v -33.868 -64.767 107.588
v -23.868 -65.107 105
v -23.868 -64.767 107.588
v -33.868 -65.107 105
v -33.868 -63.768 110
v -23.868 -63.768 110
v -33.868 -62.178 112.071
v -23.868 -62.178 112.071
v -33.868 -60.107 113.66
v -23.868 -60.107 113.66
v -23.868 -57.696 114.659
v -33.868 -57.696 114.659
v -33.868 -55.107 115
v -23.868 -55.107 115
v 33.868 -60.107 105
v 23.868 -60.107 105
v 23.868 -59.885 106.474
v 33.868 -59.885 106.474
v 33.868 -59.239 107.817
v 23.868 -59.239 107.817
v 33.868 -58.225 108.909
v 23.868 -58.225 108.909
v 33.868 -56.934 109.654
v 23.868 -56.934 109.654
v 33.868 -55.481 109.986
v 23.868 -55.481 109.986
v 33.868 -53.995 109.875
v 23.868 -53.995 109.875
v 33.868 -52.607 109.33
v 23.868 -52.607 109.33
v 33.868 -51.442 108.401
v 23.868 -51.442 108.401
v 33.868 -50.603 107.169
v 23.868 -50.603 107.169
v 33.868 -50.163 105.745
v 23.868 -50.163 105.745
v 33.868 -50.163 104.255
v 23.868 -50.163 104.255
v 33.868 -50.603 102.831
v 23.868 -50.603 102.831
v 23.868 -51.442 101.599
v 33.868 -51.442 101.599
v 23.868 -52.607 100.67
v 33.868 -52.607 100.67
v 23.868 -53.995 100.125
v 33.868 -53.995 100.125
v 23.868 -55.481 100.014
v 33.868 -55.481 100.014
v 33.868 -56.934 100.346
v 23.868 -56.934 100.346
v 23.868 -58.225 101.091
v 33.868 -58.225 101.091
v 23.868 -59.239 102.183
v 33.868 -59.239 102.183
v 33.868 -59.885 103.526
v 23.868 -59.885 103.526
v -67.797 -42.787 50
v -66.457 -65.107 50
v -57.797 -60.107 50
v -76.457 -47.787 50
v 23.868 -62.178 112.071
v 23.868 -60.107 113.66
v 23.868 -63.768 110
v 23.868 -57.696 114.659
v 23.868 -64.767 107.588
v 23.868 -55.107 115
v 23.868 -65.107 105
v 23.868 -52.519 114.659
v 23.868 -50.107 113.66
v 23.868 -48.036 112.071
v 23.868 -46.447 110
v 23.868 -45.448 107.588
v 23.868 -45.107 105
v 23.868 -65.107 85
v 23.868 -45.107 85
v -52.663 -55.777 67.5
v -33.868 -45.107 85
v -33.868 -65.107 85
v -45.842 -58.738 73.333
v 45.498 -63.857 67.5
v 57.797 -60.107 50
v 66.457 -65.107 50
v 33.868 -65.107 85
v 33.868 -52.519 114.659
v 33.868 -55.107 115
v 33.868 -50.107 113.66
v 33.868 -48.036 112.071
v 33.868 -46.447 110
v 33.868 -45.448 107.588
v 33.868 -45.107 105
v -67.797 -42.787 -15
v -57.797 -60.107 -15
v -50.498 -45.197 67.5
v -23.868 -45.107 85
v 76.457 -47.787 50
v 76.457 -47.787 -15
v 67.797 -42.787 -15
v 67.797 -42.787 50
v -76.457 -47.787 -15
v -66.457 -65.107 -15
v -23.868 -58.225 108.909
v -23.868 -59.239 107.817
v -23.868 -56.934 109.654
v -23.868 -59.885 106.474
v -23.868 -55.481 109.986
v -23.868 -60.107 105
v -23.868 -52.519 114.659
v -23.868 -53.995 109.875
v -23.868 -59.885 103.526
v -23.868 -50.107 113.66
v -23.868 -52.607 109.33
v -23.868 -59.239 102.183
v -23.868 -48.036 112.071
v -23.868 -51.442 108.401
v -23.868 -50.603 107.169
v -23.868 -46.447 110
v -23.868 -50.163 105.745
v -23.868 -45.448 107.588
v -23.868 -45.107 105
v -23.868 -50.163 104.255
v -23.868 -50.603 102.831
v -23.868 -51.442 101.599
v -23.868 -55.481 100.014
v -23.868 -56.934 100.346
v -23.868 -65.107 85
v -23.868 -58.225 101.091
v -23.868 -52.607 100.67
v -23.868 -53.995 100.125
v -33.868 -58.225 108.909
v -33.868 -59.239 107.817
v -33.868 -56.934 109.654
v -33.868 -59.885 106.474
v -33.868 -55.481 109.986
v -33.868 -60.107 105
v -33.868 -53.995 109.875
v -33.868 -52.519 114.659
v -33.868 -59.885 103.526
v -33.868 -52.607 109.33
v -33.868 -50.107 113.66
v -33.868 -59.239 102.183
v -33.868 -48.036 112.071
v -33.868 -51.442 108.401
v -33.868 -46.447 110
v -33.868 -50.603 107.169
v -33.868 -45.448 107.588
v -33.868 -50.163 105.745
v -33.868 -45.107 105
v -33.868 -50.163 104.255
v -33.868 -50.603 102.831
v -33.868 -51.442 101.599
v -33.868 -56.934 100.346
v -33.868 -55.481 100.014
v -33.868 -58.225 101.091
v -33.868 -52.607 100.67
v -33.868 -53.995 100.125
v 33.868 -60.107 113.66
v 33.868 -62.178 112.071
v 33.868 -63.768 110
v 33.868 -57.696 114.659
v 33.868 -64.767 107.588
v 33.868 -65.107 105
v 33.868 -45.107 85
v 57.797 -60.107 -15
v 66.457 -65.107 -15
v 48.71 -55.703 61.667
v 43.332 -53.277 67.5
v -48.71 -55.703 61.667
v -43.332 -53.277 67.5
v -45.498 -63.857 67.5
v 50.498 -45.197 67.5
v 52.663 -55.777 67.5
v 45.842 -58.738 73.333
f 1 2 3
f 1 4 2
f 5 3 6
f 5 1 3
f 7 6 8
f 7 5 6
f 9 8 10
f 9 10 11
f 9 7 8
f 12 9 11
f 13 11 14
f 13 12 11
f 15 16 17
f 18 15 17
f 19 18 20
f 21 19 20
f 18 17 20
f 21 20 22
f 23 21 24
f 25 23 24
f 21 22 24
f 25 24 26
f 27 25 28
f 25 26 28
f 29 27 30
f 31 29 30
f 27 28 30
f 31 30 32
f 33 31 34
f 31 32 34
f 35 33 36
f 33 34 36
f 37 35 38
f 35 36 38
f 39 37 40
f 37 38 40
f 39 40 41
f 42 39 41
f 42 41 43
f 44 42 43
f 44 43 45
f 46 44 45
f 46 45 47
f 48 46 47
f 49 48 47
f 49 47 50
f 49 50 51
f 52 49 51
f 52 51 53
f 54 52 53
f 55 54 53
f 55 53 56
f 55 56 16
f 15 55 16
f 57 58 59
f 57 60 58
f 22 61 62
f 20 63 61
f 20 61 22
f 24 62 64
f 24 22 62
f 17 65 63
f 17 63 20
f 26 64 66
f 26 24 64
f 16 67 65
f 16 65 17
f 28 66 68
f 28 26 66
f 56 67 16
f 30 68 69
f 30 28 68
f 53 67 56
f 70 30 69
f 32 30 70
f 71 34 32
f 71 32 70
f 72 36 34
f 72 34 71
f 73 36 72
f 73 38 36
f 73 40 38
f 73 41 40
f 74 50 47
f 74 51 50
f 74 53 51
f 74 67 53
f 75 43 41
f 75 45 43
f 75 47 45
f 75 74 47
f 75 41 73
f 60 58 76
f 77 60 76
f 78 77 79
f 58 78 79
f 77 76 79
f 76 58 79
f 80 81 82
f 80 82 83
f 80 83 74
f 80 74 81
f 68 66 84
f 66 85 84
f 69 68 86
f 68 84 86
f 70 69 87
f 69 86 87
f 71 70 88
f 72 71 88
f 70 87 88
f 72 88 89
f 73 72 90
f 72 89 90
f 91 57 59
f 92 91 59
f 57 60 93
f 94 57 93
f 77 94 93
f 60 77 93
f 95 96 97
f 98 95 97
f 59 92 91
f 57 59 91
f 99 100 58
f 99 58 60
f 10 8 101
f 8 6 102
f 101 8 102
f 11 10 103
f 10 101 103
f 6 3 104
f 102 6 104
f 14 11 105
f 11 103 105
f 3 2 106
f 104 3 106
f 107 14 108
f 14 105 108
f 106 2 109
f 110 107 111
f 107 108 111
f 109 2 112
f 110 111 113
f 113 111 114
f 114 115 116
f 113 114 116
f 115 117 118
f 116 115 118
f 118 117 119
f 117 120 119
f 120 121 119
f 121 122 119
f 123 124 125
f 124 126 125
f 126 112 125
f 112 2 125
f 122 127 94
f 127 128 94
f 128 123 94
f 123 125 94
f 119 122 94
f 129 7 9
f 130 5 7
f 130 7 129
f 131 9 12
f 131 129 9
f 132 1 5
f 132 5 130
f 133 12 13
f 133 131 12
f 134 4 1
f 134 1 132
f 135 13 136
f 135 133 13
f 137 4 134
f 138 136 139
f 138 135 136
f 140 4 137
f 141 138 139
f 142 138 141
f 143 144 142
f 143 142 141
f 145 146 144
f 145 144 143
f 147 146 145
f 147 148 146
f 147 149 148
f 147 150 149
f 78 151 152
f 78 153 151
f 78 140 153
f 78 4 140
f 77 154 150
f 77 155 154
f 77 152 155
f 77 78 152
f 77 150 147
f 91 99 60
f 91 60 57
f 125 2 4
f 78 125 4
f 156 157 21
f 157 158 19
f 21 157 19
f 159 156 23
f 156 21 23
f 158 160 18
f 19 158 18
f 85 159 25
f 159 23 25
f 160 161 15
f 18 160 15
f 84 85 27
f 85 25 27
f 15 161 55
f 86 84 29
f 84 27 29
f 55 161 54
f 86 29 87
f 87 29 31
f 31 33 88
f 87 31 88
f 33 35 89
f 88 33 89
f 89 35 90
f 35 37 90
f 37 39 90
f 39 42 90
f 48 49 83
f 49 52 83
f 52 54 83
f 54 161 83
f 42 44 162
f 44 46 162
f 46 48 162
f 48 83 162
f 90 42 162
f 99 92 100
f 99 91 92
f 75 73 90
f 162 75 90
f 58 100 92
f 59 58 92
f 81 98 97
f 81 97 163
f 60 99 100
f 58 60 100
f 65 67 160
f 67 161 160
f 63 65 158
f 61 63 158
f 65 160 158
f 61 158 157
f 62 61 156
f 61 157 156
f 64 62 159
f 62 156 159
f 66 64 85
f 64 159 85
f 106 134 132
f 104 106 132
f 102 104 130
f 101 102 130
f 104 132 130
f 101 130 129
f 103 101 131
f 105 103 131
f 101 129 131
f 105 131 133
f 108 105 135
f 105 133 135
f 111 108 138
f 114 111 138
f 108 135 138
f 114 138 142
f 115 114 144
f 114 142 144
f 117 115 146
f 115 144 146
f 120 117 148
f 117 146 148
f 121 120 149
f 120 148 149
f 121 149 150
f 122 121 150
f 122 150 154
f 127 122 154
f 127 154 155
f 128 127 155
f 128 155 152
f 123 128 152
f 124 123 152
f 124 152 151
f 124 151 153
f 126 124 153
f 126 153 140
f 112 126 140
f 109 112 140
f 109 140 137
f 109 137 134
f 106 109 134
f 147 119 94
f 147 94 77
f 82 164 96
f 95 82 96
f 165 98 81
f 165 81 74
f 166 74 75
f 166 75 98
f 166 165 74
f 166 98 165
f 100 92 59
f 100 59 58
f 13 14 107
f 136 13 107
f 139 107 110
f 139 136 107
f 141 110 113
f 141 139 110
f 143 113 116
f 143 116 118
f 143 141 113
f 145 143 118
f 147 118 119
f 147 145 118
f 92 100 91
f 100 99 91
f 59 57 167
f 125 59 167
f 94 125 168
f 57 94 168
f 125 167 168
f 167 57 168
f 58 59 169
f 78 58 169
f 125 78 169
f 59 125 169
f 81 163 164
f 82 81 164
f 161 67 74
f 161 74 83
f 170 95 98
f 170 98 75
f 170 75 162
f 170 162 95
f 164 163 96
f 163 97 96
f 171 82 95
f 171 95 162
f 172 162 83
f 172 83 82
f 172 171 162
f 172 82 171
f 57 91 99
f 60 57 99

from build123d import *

# Parameters (mm, degrees)
BOSS_EXTRUDE1_DEPTH        = 50
BOSS_EXTRUDE1_DEPTH_BACK   = 15
BOSS_EXTRUDE1_2_DEPTH      = 50
BOSS_EXTRUDE1_2_DEPTH_BACK = 15
BOSS_EXTRUDE2_START        = 35
SKETCH2_W                  = 10
SKETCH2_H                  = 20
BOSS_EXTRUDE2_DEPTH        = 30
SKETCH3_R                  = 5
CUT_EXTRUDE1_DEPTH         = 173.149999612
FILLET3_R                  = 10
FILLET4_R                  = 10


with BuildPart() as part:
    # Sketch1 → Boss-Extrude1 (new, two sides: drawn at the far end of the back side and taken through both)
    with BuildSketch(Plane.XY.offset(-BOSS_EXTRUDE1_DEPTH_BACK)):
        Polygon((-66.457259422, -65.10734985), (-57.797005384, -60.10734985), (-67.797005384, -42.786841774), (-76.457259422, -47.786841774), align=None)
    extrude(amount=BOSS_EXTRUDE1_DEPTH + BOSS_EXTRUDE1_DEPTH_BACK)


with BuildPart() as body_2:
    # Sketch1 → Boss-Extrude1 2 (new, two sides: drawn at the far end of the back side and taken through both)
    with BuildSketch(Plane.XY.offset(-BOSS_EXTRUDE1_2_DEPTH_BACK)):
        Polygon((57.797005384, -60.10734985), (66.457259422, -65.10734985), (76.457259422, -47.786841774), (67.797005384, -42.786841774), align=None)
    extrude(amount=BOSS_EXTRUDE1_2_DEPTH + BOSS_EXTRUDE1_2_DEPTH_BACK)



with BuildPart() as body_3:
    # Sketch2 → Boss-Extrude2 (new body)
    with BuildSketch(Plane.XY.offset(50).offset(BOSS_EXTRUDE2_START)):
        with Locations((28.867965831, -55.10734985)):
            Rectangle(SKETCH2_W, SKETCH2_H)
    extrude(amount=BOSS_EXTRUDE2_DEPTH)


with BuildPart() as body_2_1:
    add(body_2.part)

    add(body_3.part)  # loft2 joins it to this body
    # loft from a face of the part (loft2)
    loft([body_2_1.faces().sort_by_distance((67.127132403, -53.947095812, 50))[0], body_2_1.faces().sort_by_distance((28.867965831, -55.10734985, 85))[0]])


with BuildPart() as body_3_2:
    # Mirror3: mirrored copy
    add(body_2_1.part.mirror(Plane.ZY))


with BuildPart() as cut_extrude1_tool:
    # Sketch3 → Cut-Extrude1 (new, through all)
    with BuildSketch(Plane.ZY.offset(33.867965831)):
        with Locations(Location((105, -55.10734985, 0), (0, 0, 270))):
            Circle(SKETCH3_R)
    extrude(amount=-CUT_EXTRUDE1_DEPTH)


with BuildPart() as body_2_2:
    add(body_2_1.part)

    # Cut-Extrude1: cut by cut_extrude1_tool
    add(cut_extrude1_tool.part, mode=Mode.SUBTRACT)

    # Fillet4
    fillet4_edges = [body_2_2.edges().sort_by_distance(p)[0] for p in [
        (28.867965831, -45.10734985, 115),
        (28.867965831, -65.10734985, 115),
    ]]
    fillet(fillet4_edges, radius=FILLET4_R - 0.0001)  # a hair under: the kernel refuses the full size


with BuildPart() as body_3_2_1:
    add(body_3_2.part)

    # Cut-Extrude1: cut by cut_extrude1_tool
    add(cut_extrude1_tool.part, mode=Mode.SUBTRACT)

    # Fillet3
    fillet3_edges = [body_3_2_1.edges().sort_by_distance(p)[0] for p in [
        (-28.867965831, -65.10734985, 115),
        (-28.867965831, -45.10734985, 115),
    ]]
    fillet(fillet3_edges, radius=FILLET3_R - 0.0001)  # a hair under: the kernel refuses the full size


solid = Compound([part.part, body_2_2.part, body_3_2_1.part])
